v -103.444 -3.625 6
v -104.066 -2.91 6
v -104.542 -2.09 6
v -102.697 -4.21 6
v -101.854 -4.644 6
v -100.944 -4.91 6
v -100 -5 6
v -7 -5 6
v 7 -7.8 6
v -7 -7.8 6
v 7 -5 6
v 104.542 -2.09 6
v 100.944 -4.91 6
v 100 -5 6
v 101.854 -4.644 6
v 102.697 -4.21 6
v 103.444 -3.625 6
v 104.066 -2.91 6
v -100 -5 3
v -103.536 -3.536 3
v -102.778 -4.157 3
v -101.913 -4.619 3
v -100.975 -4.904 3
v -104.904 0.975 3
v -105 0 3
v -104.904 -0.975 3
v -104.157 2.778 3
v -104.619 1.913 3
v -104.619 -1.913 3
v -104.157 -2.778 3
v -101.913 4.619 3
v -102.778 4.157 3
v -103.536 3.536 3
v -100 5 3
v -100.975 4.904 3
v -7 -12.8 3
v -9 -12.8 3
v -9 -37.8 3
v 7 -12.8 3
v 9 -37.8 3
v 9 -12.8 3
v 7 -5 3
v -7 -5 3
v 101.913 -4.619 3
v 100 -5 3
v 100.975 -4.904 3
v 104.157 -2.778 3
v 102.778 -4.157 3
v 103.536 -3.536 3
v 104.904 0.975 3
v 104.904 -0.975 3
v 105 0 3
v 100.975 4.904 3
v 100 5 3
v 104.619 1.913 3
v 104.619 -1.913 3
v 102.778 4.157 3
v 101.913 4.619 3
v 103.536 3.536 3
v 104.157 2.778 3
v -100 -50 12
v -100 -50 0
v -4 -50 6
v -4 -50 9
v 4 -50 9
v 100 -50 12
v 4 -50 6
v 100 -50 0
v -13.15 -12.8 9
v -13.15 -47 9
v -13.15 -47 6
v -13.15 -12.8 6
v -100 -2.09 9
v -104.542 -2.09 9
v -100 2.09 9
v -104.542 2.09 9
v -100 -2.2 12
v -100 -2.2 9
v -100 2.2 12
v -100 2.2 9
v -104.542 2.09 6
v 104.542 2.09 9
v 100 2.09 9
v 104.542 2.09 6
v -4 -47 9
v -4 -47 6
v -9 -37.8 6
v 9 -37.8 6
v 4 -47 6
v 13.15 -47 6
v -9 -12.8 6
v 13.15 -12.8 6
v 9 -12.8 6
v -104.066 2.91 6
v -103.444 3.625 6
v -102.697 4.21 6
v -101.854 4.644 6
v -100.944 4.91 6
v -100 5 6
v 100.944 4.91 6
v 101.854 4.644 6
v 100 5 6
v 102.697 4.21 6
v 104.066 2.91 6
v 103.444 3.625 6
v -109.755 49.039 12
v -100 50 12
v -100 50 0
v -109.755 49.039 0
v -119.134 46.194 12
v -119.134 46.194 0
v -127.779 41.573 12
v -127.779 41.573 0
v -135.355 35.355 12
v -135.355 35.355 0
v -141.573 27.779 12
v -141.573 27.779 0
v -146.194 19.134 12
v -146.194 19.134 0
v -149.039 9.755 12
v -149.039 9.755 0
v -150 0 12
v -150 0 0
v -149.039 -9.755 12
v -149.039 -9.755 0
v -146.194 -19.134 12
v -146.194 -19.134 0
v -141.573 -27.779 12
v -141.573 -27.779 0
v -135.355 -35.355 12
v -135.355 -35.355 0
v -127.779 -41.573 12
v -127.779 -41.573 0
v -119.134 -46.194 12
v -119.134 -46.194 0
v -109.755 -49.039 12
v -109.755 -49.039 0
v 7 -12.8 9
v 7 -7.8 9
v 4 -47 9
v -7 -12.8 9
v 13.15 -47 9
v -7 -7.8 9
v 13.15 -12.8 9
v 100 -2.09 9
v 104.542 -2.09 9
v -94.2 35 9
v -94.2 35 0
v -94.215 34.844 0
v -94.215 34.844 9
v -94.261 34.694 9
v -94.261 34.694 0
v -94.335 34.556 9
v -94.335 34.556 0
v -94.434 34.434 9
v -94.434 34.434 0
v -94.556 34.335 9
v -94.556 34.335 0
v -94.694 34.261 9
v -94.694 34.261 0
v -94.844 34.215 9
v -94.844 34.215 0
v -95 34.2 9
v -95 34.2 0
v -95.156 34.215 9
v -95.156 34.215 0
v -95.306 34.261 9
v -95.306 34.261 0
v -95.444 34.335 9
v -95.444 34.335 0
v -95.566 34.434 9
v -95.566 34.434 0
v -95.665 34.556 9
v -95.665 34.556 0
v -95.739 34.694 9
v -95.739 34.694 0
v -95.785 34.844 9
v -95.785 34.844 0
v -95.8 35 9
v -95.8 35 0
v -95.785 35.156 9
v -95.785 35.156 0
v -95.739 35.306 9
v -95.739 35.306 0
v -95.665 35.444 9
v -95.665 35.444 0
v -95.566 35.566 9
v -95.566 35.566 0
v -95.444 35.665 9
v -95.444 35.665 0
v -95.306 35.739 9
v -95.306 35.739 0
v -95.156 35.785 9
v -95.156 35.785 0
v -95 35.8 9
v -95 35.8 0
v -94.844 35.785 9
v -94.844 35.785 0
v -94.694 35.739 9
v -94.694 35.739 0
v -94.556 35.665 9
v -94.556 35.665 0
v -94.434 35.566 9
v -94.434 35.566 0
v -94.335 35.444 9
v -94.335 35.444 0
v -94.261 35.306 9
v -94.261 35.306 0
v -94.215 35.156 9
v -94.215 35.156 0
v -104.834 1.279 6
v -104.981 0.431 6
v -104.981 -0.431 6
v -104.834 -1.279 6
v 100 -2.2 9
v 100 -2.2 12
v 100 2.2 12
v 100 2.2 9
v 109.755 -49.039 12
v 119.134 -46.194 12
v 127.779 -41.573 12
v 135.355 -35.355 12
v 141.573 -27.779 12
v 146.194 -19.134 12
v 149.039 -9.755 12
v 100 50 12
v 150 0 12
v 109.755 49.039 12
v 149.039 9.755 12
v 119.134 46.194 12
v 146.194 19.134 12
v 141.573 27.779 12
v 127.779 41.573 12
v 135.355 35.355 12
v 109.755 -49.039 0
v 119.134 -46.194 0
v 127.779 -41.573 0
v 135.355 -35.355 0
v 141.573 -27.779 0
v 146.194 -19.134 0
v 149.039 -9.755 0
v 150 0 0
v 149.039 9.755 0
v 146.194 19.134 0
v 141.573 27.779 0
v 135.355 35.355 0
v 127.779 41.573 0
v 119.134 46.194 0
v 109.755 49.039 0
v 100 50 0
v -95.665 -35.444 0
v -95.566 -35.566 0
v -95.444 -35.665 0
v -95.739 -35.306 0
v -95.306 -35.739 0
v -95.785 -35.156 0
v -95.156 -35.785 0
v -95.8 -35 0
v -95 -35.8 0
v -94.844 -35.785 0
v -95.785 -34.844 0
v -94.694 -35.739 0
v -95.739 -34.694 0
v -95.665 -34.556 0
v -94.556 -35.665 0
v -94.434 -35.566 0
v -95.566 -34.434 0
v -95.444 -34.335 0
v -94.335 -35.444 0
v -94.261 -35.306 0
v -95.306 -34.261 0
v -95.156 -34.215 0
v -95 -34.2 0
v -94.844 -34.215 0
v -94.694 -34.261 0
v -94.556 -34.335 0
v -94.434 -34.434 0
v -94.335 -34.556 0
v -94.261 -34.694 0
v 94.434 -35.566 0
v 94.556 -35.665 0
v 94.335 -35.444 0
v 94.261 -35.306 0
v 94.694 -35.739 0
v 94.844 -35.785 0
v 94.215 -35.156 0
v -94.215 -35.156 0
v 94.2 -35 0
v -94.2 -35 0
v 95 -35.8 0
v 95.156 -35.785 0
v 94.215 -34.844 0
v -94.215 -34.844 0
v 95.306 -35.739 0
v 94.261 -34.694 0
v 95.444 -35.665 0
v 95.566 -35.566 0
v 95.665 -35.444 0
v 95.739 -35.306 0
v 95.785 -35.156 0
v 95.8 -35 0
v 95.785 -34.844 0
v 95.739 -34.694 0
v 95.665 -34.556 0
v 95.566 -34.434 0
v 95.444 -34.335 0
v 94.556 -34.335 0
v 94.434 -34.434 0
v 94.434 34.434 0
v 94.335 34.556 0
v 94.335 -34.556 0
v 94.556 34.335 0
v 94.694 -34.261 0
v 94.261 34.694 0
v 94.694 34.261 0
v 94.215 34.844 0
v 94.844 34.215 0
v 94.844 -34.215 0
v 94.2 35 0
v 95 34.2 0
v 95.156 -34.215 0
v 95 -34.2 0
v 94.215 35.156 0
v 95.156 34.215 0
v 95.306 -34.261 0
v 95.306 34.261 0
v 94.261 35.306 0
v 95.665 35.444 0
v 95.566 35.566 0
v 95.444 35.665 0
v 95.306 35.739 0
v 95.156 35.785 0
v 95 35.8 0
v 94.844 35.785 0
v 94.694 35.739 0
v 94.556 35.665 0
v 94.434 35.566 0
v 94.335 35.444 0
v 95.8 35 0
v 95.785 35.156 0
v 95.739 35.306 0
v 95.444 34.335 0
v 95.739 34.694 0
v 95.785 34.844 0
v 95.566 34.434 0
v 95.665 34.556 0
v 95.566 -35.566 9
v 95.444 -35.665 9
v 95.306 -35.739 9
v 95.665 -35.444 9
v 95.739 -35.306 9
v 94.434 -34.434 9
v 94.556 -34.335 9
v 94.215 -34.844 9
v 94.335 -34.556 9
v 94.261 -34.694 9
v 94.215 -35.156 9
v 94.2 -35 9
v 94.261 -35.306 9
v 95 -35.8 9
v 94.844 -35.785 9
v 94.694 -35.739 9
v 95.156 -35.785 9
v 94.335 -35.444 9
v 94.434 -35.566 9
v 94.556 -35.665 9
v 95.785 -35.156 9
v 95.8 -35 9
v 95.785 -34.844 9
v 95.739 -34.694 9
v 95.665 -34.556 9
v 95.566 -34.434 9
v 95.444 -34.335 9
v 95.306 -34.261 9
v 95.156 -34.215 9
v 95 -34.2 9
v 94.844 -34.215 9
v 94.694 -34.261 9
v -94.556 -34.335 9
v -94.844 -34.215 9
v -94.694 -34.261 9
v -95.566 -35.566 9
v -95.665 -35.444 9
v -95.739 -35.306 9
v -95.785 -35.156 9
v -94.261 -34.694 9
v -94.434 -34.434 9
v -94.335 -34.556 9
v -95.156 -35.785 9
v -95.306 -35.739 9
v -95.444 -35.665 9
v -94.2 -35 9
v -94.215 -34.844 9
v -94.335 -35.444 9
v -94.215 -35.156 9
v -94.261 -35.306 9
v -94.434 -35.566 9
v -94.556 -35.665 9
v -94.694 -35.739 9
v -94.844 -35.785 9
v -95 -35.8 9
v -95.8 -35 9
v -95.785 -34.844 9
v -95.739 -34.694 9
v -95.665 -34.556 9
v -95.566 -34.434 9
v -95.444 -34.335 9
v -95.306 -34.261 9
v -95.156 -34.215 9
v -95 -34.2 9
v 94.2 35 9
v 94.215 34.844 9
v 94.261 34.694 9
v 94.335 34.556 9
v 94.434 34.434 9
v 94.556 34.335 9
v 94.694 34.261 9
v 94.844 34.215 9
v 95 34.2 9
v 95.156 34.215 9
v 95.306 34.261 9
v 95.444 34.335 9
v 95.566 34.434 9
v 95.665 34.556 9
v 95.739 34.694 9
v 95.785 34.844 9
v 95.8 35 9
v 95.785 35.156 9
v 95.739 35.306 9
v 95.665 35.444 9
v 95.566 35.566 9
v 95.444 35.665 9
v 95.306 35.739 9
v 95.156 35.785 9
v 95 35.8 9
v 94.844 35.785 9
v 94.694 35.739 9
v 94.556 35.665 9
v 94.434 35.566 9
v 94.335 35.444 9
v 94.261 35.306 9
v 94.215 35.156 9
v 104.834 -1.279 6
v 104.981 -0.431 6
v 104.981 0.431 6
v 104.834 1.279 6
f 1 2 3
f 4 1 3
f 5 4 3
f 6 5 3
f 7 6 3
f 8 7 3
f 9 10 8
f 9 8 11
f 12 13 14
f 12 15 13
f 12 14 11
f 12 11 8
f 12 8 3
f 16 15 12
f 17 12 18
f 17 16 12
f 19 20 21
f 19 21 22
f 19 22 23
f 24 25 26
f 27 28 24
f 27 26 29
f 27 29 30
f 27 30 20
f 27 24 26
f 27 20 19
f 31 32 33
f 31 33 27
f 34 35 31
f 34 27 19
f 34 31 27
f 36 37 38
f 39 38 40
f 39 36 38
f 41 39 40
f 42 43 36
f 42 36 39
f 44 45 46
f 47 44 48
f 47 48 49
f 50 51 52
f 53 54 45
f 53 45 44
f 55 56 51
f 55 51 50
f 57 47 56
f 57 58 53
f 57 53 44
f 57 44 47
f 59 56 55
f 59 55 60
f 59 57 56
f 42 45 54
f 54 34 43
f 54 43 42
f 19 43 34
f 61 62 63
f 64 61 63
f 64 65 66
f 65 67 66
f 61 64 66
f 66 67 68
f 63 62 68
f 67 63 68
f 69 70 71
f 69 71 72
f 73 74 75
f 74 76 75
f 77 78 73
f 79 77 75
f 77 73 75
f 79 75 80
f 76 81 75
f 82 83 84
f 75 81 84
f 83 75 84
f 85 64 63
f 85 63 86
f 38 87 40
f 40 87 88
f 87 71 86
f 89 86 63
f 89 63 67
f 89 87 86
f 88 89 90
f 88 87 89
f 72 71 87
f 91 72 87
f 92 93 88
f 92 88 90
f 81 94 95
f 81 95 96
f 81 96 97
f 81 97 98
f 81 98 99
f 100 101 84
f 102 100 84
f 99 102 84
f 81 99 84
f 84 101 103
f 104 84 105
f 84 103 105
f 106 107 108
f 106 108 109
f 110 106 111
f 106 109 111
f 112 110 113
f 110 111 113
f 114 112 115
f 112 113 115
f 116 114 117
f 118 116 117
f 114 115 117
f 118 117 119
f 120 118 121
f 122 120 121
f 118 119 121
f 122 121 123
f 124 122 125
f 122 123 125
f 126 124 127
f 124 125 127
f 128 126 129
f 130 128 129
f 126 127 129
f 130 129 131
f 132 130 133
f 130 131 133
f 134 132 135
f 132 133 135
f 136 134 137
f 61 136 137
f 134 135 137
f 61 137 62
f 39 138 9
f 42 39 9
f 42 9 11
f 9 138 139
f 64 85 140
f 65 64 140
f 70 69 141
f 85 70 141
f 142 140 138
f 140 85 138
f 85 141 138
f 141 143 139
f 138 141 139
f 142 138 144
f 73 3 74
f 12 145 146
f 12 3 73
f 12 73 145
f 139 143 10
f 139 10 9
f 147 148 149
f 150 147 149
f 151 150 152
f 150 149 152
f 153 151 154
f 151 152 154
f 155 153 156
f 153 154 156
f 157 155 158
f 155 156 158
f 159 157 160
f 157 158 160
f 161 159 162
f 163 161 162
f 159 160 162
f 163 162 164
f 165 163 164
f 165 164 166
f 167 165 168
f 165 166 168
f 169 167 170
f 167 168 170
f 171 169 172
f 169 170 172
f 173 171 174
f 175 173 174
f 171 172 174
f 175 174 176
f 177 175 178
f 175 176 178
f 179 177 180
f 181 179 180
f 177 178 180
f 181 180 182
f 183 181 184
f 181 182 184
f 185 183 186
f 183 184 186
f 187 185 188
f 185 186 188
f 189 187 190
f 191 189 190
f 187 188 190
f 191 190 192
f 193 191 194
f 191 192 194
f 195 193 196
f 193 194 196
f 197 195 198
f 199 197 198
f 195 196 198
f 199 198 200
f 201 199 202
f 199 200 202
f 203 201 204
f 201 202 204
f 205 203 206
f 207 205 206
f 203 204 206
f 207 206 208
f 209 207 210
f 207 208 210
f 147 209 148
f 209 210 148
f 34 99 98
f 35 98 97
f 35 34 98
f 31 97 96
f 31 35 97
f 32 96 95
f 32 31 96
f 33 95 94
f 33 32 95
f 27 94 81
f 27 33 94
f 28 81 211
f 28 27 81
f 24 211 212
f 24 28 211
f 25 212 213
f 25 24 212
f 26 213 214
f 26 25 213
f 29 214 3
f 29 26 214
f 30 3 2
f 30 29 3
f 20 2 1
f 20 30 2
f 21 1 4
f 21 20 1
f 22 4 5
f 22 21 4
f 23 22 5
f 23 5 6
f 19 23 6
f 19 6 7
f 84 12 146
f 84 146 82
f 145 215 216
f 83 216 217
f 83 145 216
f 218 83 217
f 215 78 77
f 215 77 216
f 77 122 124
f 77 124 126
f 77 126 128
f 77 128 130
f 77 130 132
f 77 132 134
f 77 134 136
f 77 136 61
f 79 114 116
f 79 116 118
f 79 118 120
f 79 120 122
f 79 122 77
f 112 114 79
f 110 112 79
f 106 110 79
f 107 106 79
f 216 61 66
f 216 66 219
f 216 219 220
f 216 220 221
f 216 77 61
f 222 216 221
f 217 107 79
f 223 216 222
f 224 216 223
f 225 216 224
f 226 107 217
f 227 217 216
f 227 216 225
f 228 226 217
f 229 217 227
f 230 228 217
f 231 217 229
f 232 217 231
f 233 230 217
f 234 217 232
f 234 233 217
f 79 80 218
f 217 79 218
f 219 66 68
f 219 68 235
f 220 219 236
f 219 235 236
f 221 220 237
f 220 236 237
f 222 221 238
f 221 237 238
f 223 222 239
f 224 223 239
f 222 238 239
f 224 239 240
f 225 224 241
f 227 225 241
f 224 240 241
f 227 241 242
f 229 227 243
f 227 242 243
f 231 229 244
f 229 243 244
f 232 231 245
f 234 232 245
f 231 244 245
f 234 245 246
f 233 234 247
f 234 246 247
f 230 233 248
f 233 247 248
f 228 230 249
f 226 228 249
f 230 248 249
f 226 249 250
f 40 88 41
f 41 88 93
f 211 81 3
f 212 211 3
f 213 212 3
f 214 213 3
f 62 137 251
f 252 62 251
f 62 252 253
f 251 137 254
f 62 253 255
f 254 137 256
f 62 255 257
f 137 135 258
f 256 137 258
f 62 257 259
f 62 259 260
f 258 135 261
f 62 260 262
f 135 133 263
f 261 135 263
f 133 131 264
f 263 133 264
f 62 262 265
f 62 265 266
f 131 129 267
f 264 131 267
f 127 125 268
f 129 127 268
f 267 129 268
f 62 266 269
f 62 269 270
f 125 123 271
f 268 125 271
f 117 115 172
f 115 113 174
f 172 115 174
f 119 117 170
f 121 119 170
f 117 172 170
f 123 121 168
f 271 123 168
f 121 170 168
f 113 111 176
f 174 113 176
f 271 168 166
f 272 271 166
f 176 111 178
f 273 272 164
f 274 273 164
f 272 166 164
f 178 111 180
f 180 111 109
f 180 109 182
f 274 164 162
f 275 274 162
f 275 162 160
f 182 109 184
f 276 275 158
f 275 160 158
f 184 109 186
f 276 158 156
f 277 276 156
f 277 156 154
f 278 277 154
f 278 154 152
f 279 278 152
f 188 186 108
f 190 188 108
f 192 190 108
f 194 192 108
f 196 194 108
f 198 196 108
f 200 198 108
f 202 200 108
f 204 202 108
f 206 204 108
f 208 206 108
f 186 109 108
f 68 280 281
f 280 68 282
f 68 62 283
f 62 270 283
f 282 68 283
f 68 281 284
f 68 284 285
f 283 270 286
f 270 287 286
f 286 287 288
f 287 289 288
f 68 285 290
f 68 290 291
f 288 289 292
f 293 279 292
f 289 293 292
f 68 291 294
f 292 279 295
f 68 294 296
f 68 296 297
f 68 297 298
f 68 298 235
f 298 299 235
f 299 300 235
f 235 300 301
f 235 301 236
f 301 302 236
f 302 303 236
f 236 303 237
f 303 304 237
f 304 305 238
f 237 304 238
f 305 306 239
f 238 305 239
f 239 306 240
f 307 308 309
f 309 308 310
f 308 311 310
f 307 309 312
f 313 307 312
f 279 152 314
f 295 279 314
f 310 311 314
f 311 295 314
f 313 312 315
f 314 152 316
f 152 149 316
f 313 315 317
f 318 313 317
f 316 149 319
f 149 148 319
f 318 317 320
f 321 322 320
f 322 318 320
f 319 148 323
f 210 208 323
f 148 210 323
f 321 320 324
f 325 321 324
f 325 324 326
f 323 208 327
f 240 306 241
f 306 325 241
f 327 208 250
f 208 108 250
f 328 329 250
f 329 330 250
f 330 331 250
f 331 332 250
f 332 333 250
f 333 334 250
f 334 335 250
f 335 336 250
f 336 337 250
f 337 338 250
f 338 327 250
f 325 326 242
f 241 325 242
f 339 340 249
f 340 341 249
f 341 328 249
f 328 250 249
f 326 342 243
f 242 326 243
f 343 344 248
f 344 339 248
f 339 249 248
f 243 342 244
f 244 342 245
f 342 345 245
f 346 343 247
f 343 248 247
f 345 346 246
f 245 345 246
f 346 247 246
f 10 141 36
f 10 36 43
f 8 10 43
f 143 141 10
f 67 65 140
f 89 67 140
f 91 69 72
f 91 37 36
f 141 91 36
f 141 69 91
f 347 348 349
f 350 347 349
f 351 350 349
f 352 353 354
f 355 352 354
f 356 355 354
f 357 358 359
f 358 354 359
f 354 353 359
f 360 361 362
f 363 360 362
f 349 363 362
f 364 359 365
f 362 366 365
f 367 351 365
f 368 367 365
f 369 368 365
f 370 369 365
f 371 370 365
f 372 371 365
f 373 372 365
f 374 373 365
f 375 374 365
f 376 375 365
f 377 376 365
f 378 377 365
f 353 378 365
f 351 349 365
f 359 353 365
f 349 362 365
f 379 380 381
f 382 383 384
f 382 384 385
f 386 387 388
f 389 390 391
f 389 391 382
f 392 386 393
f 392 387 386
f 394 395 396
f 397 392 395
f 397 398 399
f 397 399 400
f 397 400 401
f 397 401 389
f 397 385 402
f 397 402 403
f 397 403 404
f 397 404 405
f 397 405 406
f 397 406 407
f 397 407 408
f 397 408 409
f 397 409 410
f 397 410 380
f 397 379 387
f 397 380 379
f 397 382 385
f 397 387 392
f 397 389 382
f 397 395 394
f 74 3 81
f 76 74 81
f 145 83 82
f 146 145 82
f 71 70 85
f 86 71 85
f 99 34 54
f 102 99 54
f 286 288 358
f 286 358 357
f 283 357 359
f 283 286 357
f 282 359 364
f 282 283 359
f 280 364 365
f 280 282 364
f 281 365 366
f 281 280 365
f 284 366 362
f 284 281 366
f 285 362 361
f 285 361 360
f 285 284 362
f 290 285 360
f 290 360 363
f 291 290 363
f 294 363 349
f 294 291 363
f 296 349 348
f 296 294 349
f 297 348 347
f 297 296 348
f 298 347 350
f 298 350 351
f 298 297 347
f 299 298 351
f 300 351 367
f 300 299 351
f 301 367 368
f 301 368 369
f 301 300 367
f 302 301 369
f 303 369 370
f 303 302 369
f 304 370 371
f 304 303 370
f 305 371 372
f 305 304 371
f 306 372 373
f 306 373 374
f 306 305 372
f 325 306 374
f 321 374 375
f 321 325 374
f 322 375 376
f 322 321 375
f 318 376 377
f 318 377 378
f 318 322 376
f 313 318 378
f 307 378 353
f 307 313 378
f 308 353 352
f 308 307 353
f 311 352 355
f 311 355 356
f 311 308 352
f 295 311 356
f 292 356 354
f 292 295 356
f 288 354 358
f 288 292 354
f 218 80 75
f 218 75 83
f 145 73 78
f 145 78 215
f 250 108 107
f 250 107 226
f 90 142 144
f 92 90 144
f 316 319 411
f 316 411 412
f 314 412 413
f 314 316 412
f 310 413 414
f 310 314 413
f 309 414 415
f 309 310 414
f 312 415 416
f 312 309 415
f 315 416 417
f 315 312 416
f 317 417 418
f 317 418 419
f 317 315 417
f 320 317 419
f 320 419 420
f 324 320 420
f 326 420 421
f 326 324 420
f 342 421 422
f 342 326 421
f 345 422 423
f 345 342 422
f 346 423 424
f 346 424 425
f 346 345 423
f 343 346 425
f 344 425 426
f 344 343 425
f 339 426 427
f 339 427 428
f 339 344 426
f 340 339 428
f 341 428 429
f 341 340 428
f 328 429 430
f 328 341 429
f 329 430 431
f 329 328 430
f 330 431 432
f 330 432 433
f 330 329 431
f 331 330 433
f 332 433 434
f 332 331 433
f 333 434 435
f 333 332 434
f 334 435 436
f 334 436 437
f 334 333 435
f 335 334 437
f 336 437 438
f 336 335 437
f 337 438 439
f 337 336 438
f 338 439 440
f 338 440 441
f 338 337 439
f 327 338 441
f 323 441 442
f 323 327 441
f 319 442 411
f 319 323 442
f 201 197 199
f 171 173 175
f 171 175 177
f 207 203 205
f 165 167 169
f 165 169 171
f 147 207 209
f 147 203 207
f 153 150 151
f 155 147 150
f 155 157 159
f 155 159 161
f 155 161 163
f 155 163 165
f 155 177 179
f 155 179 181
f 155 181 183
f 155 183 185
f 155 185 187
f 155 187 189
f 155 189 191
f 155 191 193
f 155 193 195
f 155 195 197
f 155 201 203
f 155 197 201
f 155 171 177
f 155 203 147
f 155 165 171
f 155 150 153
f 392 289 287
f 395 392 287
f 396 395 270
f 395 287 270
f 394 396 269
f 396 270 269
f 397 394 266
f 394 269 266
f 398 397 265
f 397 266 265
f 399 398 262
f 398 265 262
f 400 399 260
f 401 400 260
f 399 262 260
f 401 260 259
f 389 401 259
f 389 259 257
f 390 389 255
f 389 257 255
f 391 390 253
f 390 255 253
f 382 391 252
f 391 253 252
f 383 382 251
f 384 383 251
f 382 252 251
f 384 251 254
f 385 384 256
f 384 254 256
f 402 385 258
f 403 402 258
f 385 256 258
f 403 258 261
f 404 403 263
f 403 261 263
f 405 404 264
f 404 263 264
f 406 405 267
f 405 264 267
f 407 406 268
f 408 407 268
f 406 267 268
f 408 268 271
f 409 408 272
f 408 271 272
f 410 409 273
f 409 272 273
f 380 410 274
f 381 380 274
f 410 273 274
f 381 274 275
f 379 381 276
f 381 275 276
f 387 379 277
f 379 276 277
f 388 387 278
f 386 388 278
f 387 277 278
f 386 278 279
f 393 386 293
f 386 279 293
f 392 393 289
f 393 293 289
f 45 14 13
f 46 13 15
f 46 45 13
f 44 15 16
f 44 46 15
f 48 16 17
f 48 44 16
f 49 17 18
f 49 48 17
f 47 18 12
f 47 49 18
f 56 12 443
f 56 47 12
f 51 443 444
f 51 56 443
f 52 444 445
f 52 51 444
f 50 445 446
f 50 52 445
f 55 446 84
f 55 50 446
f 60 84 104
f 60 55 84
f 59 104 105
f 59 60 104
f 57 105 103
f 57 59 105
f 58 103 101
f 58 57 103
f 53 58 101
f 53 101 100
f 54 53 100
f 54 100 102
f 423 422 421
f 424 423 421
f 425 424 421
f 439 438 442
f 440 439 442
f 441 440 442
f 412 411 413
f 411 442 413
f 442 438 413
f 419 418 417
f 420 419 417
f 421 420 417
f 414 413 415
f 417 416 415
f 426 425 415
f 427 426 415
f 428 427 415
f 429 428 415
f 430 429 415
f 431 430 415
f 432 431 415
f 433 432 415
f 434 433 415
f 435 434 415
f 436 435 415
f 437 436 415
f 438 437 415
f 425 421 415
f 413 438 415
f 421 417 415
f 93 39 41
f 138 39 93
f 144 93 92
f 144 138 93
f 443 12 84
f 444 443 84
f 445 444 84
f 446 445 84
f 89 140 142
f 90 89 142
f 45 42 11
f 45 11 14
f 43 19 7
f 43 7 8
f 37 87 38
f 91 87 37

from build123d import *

# Parameters (mm, degrees)
PAD_DEPTH       = 3
PAD001_DEPTH    = 3
SKETCH002_W     = 209.08447
SKETCH002_H     = 4.18
PAD002_DEPTH    = 3
SKETCH003_W     = 26.3
SKETCH003_H     = 34.2
POCKET_DEPTH    = 3
SKETCH004_W     = 18
SKETCH004_H     = 25
POCKET001_DEPTH = 3
SKETCH005_W     = 14
SKETCH005_H     = 5
POCKET002_DEPTH = 6
SKETCH006_W     = 14
SKETCH006_H     = 3
POCKET003_DEPTH = 3
SKETCH007_W     = 8
SKETCH007_H     = 3
POCKET004_DEPTH = 3
SKETCH008_W     = 200
SKETCH008_H     = 4.4
PAD003_DEPTH    = 3
SKETCH009_R     = 0.8
POCKET005_DEPTH = 9


with BuildPart() as part:
    # Sketch → Pad (new body)
    with BuildSketch(Plane.XY):
        with BuildLine():
            ThreePointArc((-100, 50), (-150, 0), (-100, -50))
            Line((-100, -50), (100, -50))
            ThreePointArc((100, -50), (150, 0), (100, 50))
            Line((-100, 50), (100, 50))
        make_face()
    extrude(amount=PAD_DEPTH)

    # Sketch001 (on Face6 of Pad) → Pad001 (join)
    with BuildSketch(Plane.XY.offset(3)):
        with BuildLine():
            ThreePointArc((-100, 50), (-150, 0), (-100, -50))
            Line((-100, -50), (100, -50))
            ThreePointArc((100, -50), (150, 0), (100, 50))
            Line((-100, 50), (100, 50))
        make_face()
        with BuildLine():
            ThreePointArc((-100, 5), (-105, 0), (-100, -5))
            Line((-100, -5), (100, -5))
            ThreePointArc((100, -5), (105, 0), (100, 5))
            Line((-100, 5), (100, 5))
        make_face(mode=Mode.SUBTRACT)
    extrude(amount=PAD001_DEPTH)

    # Sketch002 (on Face9 of Pad001) → Pad002 (join)
    with BuildSketch(Plane.XY.offset(6)):
        with BuildLine():
            ThreePointArc((-100, 50), (-150, 0), (-100, -50))
            Line((-100, -50), (100, -50))
            ThreePointArc((100, -50), (150, 0), (100, 50))
            Line((-100, 50), (100, 50))
        make_face()
        Rectangle(SKETCH002_W, SKETCH002_H, mode=Mode.SUBTRACT)
    extrude(amount=PAD002_DEPTH)

    # Sketch003 (on Face13 of Pad002) → Pocket (cut)
    with BuildSketch(Plane.XY.offset(9)):
        with Locations((0, -29.9)):
            Rectangle(SKETCH003_W, SKETCH003_H)
    extrude(amount=-POCKET_DEPTH, mode=Mode.SUBTRACT)

    # Sketch004 (on Face27 of Pocket) → Pocket001 (cut)
    with BuildSketch(Plane.XY.offset(6)):
        with Locations((0, -25.3)):
            Rectangle(SKETCH004_W, SKETCH004_H)
    extrude(amount=-POCKET001_DEPTH, mode=Mode.SUBTRACT)

    # Sketch005 (on Face13 of Pocket001) → Pocket002 (cut)
    with BuildSketch(Plane.XY.offset(9)):
        with Locations((0, -10.3)):
            Rectangle(SKETCH005_W, SKETCH005_H)
    extrude(amount=-POCKET002_DEPTH, mode=Mode.SUBTRACT)

    # Sketch006 (on Face23 of Pocket002) → Pocket003 (cut)
    with BuildSketch(Plane.XZ.offset(7.8)):
        with Locations((0, 4.5)):
            Rectangle(SKETCH006_W, SKETCH006_H)
    extrude(amount=-POCKET003_DEPTH, mode=Mode.SUBTRACT)

    # Sketch007 (on Face13 of Pocket003) → Pocket004 (cut)
    with BuildSketch(Plane.XY.offset(9)):
        with Locations((0, -48.5)):
            Rectangle(SKETCH007_W, SKETCH007_H)
    extrude(amount=-POCKET004_DEPTH, mode=Mode.SUBTRACT)

    # Sketch008 (on Face15 of Pocket004) → Pad003 (join)
    with BuildSketch(Plane.XY.offset(9)):
        with BuildLine():
            ThreePointArc((-100, 50), (-150, 0), (-100, -50))
            Line((-100, -50), (100, -50))
            ThreePointArc((100, -50), (150, 0), (100, 50))
            Line((-100, 50), (100, 50))
        make_face()
        Rectangle(SKETCH008_W, SKETCH008_H, mode=Mode.SUBTRACT)
    extrude(amount=PAD003_DEPTH)

    # Sketch009 (on Face4 of Pad003) → Pocket005 (cut)
    with BuildSketch(Plane(origin=(0, 0, 0), x_dir=(1, 0, 0), z_dir=(0, 0, -1))):
        with Locations((-95, 35)):
            Circle(SKETCH009_R)
        with Locations((-95, -35)):
            Circle(SKETCH009_R)
    pocket005 = extrude(amount=-POCKET005_DEPTH, mode=Mode.SUBTRACT)

    # Mirrored: Pocket005 across Sketch009 V_Axis
    add(pocket005.mirror(Plane(origin=(0, 0, 0), x_dir=(0, 0, -1), z_dir=(1, 0, 0))), mode=Mode.SUBTRACT)


solid = part.part
